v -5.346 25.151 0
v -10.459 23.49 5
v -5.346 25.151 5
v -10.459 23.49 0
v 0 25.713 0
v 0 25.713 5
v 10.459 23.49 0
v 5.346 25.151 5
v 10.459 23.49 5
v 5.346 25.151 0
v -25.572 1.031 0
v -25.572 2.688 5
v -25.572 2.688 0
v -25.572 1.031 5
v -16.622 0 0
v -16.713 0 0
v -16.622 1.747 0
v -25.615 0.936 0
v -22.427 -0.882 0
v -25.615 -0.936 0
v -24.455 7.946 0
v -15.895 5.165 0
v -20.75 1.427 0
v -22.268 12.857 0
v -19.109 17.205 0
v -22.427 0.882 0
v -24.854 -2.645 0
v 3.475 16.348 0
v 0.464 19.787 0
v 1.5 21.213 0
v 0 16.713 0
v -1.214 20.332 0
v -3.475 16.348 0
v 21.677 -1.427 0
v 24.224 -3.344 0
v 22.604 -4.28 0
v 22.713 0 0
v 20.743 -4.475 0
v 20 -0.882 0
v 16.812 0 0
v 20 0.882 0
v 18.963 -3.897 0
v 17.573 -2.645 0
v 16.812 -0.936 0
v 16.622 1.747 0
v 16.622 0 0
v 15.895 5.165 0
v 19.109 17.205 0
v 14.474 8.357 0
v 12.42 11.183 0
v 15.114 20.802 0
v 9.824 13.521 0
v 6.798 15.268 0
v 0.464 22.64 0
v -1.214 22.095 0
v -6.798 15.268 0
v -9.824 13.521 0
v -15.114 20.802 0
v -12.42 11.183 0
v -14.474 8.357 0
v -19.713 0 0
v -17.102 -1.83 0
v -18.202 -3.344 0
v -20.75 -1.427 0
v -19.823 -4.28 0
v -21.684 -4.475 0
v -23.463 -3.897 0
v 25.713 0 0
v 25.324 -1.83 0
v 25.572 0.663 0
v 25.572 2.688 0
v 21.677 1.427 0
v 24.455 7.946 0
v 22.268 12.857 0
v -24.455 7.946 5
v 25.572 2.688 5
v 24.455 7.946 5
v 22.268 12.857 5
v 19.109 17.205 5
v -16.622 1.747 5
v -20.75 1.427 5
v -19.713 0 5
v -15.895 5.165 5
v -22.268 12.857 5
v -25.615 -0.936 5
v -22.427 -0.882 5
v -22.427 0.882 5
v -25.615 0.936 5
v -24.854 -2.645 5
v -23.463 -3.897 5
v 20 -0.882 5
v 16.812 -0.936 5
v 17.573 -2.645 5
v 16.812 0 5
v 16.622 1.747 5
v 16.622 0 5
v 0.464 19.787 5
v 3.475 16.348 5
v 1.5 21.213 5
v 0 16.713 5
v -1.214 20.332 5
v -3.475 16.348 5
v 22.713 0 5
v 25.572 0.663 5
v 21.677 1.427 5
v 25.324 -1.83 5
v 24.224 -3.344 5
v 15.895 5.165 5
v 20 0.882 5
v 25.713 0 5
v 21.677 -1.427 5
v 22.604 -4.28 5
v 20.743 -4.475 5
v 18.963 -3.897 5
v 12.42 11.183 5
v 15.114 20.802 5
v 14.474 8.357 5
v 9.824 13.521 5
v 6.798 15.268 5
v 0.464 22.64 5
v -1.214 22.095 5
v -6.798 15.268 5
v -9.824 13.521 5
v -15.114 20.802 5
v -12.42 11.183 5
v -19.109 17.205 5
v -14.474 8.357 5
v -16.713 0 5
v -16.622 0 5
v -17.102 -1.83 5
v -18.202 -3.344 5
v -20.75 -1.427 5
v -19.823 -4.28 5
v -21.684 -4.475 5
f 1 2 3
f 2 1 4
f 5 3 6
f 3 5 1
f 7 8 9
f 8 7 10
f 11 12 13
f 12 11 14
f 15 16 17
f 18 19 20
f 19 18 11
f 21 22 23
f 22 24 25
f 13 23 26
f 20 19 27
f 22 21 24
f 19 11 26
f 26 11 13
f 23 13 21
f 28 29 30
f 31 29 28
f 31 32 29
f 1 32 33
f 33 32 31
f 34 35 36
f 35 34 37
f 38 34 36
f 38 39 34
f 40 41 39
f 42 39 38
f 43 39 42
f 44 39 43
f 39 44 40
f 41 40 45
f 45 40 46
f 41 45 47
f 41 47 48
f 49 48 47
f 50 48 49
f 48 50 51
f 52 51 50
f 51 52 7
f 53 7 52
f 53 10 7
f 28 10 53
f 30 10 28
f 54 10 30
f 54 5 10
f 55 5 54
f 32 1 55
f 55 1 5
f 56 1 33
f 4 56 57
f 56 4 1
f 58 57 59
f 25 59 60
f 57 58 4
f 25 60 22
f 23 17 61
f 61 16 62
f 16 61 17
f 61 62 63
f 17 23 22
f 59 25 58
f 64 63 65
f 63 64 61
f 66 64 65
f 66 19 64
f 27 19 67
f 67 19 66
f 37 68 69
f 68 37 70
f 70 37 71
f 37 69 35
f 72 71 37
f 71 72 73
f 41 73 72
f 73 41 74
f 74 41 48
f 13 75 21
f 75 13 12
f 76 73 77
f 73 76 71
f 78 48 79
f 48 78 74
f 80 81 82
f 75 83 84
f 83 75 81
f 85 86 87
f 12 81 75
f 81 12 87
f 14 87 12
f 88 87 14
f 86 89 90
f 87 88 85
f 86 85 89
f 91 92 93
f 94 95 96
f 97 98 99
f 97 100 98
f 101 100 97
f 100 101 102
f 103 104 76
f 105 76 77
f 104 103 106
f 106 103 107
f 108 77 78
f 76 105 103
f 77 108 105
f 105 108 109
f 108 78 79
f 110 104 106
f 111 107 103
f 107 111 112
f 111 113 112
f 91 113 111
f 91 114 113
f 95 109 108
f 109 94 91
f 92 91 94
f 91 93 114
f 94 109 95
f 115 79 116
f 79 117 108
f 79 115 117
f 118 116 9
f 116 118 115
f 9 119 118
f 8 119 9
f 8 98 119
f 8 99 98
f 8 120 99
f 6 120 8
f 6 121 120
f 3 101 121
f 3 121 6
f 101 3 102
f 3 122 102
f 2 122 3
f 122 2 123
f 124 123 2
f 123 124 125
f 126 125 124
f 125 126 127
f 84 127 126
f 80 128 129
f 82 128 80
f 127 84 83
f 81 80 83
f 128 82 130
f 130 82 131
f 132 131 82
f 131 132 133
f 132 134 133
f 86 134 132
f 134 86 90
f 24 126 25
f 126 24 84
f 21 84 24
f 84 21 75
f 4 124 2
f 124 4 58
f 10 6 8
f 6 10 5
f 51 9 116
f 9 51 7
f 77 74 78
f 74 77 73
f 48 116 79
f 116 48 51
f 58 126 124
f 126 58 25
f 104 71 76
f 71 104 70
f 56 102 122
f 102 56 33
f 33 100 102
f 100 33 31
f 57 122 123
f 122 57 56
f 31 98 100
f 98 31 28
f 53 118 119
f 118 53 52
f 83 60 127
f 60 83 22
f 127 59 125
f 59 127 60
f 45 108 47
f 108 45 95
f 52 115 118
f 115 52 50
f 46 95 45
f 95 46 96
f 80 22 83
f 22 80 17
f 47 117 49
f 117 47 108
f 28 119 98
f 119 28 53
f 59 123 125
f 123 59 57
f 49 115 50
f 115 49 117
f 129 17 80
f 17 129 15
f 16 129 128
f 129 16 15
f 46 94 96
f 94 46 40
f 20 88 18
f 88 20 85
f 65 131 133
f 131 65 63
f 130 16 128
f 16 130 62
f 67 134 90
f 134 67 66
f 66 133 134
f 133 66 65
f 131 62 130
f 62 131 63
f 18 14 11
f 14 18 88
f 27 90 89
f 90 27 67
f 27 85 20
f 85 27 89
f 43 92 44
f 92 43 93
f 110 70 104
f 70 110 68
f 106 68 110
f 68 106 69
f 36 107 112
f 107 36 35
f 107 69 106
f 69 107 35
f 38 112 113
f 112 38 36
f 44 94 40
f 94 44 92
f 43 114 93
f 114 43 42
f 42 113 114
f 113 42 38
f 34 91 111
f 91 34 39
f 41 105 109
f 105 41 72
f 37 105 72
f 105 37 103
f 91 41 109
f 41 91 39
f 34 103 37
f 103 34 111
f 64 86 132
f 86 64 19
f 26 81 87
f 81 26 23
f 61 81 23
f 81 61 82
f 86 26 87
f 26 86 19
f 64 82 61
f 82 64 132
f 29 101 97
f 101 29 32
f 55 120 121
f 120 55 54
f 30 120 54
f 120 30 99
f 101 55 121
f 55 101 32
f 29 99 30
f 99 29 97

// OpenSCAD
// file: arc.scad
/* Yet Another Arc Library
 * Calculates an arc by cutting apart cylinders. Only good in the z plane.
 * What's kind of nice is that you can jsut specify what the coordinates of
 * your arc should start and end at.
 * Only good up to 180 degrees.
 */

function scalar(vec) = sqrt(pow(vec.x, 2) + pow(vec.y, 2) + pow(vec.z, 2));

module arc(startCoordinates, endCoordinates, degrees, height, width) {
	deltaCoordinates = endCoordinates - startCoordinates;
	currArcLength = scalar(deltaCoordinates);
	radius = currArcLength / (2 * sin(degrees/2));
	
	render() {
		translate(endCoordinates)
			rotate(atan2(-deltaCoordinates.y, -deltaCoordinates.x))
				lineUpArc(currArcLength, degrees, radius, height, width);
		translate(endCoordinates)
			cylinder(h = height, d = width);
		translate(startCoordinates)
			cylinder(h = height, d = width);
	}
}

module lineUpArc(currArcLength, degrees, radius, height, width) {
	outerArcDiameter = radius * 2 + width;
	innerArcDiameter = radius * 2 - width;
	translate([currArcLength/2,-cos(degrees / 2)*radius,0])
		rotate(degrees / 2)
			roughArc(outerArcDiameter, innerArcDiameter, degrees, height);
}

module roughArc(outerArcDiameter, innerArcDiameter, degrees, height) {
	difference() {
		rotate(180 - degrees) difference() {
			hollowCylinder(outerArcDiameter, innerArcDiameter, height);
			translate([-outerArcDiameter / 2, -outerArcDiameter / 2, 0])
			cube([outerArcDiameter / 2, outerArcDiameter, height]);
		}
		translate([-outerArcDiameter / 2, -outerArcDiameter / 2, 0])
			cube([outerArcDiameter / 2, outerArcDiameter, height]);
	}
}

module hollowCylinder(outerArcDiameter, innerArcDiameter, height) {
	difference() {
		cylinder(h = height, d = outerArcDiameter);
		cylinder(h = height, d = innerArcDiameter);
	}
}


// BEGIN TESTS
// Several Different Arcs

translate([0, 0, 0])
	arc([0,0,0], [0,5,0], 30, 7, 1);

translate([20, 0, 0])
	arc([0,0,0],  [0,5,0], 45, 7, 1);

translate([40, 0, 0])
	arc([-5,0,0],  [0,5,0], 90, 7, 1);

translate([60, 0, 0])
	arc([5,0,0],  [0,5,0], 135, 7, 1);

translate([80, 0, 0])
	arc([0,0,0],  [0,5,0], 180, 7, 1);
// main file
use<arc.scad>;

module drawMotorAssembly(height, spacing, screwHoleDiameter, thickness) {
	motorHoleDiameter = sqrt(spacing * spacing * 2);
	motorHoleRadius = motorHoleDiameter / 2;
	difference() {
		arc([motorHoleRadius, 0, 0],
			[-motorHoleRadius, 0, 0],
			180, height, thickness * 2 + screwHoleDiameter);
		drawMotorScrews(height, motorHoleDiameter, screwHoleDiameter);
	}
}

module drawMotorScrews(height, motorHoleDiameter, screwHoleDiameter) {
	translate([motorHoleDiameter / 2,0,0])
		cylinder(h = height, d = screwHoleDiameter);
	translate([-motorHoleDiameter / 2,0,0])
		cylinder(h = height, d = screwHoleDiameter);
	translate([0, motorHoleDiameter / 2, 0])
		cylinder(h = height, d = screwHoleDiameter);
}


drawMotorAssembly(5, 30, 3, 3);
